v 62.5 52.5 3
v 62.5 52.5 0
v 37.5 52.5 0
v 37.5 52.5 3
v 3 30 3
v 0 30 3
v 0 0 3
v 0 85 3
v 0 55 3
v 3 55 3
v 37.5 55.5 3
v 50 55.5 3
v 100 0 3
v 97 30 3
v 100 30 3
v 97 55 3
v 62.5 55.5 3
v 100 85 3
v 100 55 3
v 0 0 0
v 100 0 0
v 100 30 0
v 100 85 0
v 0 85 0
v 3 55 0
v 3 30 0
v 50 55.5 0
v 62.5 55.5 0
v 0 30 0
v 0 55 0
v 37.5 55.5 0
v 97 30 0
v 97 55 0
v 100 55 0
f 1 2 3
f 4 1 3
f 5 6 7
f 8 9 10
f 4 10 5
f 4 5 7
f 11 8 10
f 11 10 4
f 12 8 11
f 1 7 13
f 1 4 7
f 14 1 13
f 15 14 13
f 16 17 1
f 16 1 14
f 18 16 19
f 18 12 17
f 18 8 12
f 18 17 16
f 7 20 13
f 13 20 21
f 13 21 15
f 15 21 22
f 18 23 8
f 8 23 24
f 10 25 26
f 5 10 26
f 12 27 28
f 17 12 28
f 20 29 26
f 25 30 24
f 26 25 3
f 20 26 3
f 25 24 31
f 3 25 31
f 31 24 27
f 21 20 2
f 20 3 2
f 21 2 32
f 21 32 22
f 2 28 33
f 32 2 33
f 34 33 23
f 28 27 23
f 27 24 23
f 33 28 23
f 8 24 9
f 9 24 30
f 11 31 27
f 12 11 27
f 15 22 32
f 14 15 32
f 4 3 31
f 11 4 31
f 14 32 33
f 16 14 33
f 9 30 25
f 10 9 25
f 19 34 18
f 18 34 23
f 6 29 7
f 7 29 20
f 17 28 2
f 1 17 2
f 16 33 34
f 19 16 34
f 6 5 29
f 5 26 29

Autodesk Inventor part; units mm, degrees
ref_plane "YZ Plane" through (0, 0, 0) normal (1, 0, 0) x (0, 1, 0)
ref_plane "XZ Plane" through (0, 0, 0) normal (0, 1, 0) x (-1, 0, 0)
ref_plane "XY Plane" through (0, 0, 0) normal (0, 0, 1) x (1, 0, 0)
sketch "Sketch1" plane through (0, 0, 0) normal (0, 0, 1) x (1, 0, 0)
  line L0 (0, 0) -> (100, 0)
  line L1 (100, 0) -> (100, 30)
  line L2 (100, 30) -> (97, 30)
  line L3 (97, 30) -> (97, 55)
  line L4 (97, 55) -> (100, 55)
  line L5 (100, 55) -> (100, 85)
  line L6 (100, 85) -> (0, 85)
  line L7 (0, 85) -> (0, 55)
  line L8 (0, 55) -> (3, 55)
  line L9 (3, 55) -> (3, 30)
  line L10 (3, 30) -> (0, 30)
  line L11 (0, 30) -> (0, 0)
  line L12 (50, 0) -> (50, 52.5) construction
  line L13 (50, 52.5) -> (50, 80) construction
  circle A0 centre (50, 80) radius 27.5 construction
  line L14 (50, 80) -> (50, 85) construction
  line L15 (50, 107.5) -> (50, 85) construction
  line L16 (50, 52.5) -> (50, 60.5) construction
  line L17 (50, 60.5) -> (50, 70.5) construction
  line L18 (50, 52.5) -> (50, 55.5) construction
  line L19 (50, 55.5) -> (50, 52.5) construction
  line L20 (50, 55.5) -> (62.5, 55.5)
  line L21 (62.5, 55.5) -> (62.5, 52.5)
  line L22 (62.5, 52.5) -> (37.5, 52.5)
  line L23 (37.5, 52.5) -> (37.5, 55.5)
  line L24 (37.5, 55.5) -> (50, 55.5)
  dimension "d15" = 55
  dimension "d0" = 100
  dimension "d1" = 30
  dimension "d3" = 25
  dimension "d4" = 3
  dimension "d5" = 30
  dimension "d6" = 100
  dimension "d7" = 30
  dimension "d8" = 3
  dimension "d9" = 25
  dimension "d10" = 3
  dimension "d13" = 52.5
  dimension "d14" = 27.5
  dimension "d17" = 8
  dimension "d18" = 10
  dimension "d21" = 3
  dimension "d22" = 12.5
  dimension "d23" = 3
  dimension "d24" = 25
  dimension "d25" = 3
  dimension "d26" = 52.5
extrude "Extrusion1" add sketch "Sketch1" along normal blind 3
properties part number "Samping"
